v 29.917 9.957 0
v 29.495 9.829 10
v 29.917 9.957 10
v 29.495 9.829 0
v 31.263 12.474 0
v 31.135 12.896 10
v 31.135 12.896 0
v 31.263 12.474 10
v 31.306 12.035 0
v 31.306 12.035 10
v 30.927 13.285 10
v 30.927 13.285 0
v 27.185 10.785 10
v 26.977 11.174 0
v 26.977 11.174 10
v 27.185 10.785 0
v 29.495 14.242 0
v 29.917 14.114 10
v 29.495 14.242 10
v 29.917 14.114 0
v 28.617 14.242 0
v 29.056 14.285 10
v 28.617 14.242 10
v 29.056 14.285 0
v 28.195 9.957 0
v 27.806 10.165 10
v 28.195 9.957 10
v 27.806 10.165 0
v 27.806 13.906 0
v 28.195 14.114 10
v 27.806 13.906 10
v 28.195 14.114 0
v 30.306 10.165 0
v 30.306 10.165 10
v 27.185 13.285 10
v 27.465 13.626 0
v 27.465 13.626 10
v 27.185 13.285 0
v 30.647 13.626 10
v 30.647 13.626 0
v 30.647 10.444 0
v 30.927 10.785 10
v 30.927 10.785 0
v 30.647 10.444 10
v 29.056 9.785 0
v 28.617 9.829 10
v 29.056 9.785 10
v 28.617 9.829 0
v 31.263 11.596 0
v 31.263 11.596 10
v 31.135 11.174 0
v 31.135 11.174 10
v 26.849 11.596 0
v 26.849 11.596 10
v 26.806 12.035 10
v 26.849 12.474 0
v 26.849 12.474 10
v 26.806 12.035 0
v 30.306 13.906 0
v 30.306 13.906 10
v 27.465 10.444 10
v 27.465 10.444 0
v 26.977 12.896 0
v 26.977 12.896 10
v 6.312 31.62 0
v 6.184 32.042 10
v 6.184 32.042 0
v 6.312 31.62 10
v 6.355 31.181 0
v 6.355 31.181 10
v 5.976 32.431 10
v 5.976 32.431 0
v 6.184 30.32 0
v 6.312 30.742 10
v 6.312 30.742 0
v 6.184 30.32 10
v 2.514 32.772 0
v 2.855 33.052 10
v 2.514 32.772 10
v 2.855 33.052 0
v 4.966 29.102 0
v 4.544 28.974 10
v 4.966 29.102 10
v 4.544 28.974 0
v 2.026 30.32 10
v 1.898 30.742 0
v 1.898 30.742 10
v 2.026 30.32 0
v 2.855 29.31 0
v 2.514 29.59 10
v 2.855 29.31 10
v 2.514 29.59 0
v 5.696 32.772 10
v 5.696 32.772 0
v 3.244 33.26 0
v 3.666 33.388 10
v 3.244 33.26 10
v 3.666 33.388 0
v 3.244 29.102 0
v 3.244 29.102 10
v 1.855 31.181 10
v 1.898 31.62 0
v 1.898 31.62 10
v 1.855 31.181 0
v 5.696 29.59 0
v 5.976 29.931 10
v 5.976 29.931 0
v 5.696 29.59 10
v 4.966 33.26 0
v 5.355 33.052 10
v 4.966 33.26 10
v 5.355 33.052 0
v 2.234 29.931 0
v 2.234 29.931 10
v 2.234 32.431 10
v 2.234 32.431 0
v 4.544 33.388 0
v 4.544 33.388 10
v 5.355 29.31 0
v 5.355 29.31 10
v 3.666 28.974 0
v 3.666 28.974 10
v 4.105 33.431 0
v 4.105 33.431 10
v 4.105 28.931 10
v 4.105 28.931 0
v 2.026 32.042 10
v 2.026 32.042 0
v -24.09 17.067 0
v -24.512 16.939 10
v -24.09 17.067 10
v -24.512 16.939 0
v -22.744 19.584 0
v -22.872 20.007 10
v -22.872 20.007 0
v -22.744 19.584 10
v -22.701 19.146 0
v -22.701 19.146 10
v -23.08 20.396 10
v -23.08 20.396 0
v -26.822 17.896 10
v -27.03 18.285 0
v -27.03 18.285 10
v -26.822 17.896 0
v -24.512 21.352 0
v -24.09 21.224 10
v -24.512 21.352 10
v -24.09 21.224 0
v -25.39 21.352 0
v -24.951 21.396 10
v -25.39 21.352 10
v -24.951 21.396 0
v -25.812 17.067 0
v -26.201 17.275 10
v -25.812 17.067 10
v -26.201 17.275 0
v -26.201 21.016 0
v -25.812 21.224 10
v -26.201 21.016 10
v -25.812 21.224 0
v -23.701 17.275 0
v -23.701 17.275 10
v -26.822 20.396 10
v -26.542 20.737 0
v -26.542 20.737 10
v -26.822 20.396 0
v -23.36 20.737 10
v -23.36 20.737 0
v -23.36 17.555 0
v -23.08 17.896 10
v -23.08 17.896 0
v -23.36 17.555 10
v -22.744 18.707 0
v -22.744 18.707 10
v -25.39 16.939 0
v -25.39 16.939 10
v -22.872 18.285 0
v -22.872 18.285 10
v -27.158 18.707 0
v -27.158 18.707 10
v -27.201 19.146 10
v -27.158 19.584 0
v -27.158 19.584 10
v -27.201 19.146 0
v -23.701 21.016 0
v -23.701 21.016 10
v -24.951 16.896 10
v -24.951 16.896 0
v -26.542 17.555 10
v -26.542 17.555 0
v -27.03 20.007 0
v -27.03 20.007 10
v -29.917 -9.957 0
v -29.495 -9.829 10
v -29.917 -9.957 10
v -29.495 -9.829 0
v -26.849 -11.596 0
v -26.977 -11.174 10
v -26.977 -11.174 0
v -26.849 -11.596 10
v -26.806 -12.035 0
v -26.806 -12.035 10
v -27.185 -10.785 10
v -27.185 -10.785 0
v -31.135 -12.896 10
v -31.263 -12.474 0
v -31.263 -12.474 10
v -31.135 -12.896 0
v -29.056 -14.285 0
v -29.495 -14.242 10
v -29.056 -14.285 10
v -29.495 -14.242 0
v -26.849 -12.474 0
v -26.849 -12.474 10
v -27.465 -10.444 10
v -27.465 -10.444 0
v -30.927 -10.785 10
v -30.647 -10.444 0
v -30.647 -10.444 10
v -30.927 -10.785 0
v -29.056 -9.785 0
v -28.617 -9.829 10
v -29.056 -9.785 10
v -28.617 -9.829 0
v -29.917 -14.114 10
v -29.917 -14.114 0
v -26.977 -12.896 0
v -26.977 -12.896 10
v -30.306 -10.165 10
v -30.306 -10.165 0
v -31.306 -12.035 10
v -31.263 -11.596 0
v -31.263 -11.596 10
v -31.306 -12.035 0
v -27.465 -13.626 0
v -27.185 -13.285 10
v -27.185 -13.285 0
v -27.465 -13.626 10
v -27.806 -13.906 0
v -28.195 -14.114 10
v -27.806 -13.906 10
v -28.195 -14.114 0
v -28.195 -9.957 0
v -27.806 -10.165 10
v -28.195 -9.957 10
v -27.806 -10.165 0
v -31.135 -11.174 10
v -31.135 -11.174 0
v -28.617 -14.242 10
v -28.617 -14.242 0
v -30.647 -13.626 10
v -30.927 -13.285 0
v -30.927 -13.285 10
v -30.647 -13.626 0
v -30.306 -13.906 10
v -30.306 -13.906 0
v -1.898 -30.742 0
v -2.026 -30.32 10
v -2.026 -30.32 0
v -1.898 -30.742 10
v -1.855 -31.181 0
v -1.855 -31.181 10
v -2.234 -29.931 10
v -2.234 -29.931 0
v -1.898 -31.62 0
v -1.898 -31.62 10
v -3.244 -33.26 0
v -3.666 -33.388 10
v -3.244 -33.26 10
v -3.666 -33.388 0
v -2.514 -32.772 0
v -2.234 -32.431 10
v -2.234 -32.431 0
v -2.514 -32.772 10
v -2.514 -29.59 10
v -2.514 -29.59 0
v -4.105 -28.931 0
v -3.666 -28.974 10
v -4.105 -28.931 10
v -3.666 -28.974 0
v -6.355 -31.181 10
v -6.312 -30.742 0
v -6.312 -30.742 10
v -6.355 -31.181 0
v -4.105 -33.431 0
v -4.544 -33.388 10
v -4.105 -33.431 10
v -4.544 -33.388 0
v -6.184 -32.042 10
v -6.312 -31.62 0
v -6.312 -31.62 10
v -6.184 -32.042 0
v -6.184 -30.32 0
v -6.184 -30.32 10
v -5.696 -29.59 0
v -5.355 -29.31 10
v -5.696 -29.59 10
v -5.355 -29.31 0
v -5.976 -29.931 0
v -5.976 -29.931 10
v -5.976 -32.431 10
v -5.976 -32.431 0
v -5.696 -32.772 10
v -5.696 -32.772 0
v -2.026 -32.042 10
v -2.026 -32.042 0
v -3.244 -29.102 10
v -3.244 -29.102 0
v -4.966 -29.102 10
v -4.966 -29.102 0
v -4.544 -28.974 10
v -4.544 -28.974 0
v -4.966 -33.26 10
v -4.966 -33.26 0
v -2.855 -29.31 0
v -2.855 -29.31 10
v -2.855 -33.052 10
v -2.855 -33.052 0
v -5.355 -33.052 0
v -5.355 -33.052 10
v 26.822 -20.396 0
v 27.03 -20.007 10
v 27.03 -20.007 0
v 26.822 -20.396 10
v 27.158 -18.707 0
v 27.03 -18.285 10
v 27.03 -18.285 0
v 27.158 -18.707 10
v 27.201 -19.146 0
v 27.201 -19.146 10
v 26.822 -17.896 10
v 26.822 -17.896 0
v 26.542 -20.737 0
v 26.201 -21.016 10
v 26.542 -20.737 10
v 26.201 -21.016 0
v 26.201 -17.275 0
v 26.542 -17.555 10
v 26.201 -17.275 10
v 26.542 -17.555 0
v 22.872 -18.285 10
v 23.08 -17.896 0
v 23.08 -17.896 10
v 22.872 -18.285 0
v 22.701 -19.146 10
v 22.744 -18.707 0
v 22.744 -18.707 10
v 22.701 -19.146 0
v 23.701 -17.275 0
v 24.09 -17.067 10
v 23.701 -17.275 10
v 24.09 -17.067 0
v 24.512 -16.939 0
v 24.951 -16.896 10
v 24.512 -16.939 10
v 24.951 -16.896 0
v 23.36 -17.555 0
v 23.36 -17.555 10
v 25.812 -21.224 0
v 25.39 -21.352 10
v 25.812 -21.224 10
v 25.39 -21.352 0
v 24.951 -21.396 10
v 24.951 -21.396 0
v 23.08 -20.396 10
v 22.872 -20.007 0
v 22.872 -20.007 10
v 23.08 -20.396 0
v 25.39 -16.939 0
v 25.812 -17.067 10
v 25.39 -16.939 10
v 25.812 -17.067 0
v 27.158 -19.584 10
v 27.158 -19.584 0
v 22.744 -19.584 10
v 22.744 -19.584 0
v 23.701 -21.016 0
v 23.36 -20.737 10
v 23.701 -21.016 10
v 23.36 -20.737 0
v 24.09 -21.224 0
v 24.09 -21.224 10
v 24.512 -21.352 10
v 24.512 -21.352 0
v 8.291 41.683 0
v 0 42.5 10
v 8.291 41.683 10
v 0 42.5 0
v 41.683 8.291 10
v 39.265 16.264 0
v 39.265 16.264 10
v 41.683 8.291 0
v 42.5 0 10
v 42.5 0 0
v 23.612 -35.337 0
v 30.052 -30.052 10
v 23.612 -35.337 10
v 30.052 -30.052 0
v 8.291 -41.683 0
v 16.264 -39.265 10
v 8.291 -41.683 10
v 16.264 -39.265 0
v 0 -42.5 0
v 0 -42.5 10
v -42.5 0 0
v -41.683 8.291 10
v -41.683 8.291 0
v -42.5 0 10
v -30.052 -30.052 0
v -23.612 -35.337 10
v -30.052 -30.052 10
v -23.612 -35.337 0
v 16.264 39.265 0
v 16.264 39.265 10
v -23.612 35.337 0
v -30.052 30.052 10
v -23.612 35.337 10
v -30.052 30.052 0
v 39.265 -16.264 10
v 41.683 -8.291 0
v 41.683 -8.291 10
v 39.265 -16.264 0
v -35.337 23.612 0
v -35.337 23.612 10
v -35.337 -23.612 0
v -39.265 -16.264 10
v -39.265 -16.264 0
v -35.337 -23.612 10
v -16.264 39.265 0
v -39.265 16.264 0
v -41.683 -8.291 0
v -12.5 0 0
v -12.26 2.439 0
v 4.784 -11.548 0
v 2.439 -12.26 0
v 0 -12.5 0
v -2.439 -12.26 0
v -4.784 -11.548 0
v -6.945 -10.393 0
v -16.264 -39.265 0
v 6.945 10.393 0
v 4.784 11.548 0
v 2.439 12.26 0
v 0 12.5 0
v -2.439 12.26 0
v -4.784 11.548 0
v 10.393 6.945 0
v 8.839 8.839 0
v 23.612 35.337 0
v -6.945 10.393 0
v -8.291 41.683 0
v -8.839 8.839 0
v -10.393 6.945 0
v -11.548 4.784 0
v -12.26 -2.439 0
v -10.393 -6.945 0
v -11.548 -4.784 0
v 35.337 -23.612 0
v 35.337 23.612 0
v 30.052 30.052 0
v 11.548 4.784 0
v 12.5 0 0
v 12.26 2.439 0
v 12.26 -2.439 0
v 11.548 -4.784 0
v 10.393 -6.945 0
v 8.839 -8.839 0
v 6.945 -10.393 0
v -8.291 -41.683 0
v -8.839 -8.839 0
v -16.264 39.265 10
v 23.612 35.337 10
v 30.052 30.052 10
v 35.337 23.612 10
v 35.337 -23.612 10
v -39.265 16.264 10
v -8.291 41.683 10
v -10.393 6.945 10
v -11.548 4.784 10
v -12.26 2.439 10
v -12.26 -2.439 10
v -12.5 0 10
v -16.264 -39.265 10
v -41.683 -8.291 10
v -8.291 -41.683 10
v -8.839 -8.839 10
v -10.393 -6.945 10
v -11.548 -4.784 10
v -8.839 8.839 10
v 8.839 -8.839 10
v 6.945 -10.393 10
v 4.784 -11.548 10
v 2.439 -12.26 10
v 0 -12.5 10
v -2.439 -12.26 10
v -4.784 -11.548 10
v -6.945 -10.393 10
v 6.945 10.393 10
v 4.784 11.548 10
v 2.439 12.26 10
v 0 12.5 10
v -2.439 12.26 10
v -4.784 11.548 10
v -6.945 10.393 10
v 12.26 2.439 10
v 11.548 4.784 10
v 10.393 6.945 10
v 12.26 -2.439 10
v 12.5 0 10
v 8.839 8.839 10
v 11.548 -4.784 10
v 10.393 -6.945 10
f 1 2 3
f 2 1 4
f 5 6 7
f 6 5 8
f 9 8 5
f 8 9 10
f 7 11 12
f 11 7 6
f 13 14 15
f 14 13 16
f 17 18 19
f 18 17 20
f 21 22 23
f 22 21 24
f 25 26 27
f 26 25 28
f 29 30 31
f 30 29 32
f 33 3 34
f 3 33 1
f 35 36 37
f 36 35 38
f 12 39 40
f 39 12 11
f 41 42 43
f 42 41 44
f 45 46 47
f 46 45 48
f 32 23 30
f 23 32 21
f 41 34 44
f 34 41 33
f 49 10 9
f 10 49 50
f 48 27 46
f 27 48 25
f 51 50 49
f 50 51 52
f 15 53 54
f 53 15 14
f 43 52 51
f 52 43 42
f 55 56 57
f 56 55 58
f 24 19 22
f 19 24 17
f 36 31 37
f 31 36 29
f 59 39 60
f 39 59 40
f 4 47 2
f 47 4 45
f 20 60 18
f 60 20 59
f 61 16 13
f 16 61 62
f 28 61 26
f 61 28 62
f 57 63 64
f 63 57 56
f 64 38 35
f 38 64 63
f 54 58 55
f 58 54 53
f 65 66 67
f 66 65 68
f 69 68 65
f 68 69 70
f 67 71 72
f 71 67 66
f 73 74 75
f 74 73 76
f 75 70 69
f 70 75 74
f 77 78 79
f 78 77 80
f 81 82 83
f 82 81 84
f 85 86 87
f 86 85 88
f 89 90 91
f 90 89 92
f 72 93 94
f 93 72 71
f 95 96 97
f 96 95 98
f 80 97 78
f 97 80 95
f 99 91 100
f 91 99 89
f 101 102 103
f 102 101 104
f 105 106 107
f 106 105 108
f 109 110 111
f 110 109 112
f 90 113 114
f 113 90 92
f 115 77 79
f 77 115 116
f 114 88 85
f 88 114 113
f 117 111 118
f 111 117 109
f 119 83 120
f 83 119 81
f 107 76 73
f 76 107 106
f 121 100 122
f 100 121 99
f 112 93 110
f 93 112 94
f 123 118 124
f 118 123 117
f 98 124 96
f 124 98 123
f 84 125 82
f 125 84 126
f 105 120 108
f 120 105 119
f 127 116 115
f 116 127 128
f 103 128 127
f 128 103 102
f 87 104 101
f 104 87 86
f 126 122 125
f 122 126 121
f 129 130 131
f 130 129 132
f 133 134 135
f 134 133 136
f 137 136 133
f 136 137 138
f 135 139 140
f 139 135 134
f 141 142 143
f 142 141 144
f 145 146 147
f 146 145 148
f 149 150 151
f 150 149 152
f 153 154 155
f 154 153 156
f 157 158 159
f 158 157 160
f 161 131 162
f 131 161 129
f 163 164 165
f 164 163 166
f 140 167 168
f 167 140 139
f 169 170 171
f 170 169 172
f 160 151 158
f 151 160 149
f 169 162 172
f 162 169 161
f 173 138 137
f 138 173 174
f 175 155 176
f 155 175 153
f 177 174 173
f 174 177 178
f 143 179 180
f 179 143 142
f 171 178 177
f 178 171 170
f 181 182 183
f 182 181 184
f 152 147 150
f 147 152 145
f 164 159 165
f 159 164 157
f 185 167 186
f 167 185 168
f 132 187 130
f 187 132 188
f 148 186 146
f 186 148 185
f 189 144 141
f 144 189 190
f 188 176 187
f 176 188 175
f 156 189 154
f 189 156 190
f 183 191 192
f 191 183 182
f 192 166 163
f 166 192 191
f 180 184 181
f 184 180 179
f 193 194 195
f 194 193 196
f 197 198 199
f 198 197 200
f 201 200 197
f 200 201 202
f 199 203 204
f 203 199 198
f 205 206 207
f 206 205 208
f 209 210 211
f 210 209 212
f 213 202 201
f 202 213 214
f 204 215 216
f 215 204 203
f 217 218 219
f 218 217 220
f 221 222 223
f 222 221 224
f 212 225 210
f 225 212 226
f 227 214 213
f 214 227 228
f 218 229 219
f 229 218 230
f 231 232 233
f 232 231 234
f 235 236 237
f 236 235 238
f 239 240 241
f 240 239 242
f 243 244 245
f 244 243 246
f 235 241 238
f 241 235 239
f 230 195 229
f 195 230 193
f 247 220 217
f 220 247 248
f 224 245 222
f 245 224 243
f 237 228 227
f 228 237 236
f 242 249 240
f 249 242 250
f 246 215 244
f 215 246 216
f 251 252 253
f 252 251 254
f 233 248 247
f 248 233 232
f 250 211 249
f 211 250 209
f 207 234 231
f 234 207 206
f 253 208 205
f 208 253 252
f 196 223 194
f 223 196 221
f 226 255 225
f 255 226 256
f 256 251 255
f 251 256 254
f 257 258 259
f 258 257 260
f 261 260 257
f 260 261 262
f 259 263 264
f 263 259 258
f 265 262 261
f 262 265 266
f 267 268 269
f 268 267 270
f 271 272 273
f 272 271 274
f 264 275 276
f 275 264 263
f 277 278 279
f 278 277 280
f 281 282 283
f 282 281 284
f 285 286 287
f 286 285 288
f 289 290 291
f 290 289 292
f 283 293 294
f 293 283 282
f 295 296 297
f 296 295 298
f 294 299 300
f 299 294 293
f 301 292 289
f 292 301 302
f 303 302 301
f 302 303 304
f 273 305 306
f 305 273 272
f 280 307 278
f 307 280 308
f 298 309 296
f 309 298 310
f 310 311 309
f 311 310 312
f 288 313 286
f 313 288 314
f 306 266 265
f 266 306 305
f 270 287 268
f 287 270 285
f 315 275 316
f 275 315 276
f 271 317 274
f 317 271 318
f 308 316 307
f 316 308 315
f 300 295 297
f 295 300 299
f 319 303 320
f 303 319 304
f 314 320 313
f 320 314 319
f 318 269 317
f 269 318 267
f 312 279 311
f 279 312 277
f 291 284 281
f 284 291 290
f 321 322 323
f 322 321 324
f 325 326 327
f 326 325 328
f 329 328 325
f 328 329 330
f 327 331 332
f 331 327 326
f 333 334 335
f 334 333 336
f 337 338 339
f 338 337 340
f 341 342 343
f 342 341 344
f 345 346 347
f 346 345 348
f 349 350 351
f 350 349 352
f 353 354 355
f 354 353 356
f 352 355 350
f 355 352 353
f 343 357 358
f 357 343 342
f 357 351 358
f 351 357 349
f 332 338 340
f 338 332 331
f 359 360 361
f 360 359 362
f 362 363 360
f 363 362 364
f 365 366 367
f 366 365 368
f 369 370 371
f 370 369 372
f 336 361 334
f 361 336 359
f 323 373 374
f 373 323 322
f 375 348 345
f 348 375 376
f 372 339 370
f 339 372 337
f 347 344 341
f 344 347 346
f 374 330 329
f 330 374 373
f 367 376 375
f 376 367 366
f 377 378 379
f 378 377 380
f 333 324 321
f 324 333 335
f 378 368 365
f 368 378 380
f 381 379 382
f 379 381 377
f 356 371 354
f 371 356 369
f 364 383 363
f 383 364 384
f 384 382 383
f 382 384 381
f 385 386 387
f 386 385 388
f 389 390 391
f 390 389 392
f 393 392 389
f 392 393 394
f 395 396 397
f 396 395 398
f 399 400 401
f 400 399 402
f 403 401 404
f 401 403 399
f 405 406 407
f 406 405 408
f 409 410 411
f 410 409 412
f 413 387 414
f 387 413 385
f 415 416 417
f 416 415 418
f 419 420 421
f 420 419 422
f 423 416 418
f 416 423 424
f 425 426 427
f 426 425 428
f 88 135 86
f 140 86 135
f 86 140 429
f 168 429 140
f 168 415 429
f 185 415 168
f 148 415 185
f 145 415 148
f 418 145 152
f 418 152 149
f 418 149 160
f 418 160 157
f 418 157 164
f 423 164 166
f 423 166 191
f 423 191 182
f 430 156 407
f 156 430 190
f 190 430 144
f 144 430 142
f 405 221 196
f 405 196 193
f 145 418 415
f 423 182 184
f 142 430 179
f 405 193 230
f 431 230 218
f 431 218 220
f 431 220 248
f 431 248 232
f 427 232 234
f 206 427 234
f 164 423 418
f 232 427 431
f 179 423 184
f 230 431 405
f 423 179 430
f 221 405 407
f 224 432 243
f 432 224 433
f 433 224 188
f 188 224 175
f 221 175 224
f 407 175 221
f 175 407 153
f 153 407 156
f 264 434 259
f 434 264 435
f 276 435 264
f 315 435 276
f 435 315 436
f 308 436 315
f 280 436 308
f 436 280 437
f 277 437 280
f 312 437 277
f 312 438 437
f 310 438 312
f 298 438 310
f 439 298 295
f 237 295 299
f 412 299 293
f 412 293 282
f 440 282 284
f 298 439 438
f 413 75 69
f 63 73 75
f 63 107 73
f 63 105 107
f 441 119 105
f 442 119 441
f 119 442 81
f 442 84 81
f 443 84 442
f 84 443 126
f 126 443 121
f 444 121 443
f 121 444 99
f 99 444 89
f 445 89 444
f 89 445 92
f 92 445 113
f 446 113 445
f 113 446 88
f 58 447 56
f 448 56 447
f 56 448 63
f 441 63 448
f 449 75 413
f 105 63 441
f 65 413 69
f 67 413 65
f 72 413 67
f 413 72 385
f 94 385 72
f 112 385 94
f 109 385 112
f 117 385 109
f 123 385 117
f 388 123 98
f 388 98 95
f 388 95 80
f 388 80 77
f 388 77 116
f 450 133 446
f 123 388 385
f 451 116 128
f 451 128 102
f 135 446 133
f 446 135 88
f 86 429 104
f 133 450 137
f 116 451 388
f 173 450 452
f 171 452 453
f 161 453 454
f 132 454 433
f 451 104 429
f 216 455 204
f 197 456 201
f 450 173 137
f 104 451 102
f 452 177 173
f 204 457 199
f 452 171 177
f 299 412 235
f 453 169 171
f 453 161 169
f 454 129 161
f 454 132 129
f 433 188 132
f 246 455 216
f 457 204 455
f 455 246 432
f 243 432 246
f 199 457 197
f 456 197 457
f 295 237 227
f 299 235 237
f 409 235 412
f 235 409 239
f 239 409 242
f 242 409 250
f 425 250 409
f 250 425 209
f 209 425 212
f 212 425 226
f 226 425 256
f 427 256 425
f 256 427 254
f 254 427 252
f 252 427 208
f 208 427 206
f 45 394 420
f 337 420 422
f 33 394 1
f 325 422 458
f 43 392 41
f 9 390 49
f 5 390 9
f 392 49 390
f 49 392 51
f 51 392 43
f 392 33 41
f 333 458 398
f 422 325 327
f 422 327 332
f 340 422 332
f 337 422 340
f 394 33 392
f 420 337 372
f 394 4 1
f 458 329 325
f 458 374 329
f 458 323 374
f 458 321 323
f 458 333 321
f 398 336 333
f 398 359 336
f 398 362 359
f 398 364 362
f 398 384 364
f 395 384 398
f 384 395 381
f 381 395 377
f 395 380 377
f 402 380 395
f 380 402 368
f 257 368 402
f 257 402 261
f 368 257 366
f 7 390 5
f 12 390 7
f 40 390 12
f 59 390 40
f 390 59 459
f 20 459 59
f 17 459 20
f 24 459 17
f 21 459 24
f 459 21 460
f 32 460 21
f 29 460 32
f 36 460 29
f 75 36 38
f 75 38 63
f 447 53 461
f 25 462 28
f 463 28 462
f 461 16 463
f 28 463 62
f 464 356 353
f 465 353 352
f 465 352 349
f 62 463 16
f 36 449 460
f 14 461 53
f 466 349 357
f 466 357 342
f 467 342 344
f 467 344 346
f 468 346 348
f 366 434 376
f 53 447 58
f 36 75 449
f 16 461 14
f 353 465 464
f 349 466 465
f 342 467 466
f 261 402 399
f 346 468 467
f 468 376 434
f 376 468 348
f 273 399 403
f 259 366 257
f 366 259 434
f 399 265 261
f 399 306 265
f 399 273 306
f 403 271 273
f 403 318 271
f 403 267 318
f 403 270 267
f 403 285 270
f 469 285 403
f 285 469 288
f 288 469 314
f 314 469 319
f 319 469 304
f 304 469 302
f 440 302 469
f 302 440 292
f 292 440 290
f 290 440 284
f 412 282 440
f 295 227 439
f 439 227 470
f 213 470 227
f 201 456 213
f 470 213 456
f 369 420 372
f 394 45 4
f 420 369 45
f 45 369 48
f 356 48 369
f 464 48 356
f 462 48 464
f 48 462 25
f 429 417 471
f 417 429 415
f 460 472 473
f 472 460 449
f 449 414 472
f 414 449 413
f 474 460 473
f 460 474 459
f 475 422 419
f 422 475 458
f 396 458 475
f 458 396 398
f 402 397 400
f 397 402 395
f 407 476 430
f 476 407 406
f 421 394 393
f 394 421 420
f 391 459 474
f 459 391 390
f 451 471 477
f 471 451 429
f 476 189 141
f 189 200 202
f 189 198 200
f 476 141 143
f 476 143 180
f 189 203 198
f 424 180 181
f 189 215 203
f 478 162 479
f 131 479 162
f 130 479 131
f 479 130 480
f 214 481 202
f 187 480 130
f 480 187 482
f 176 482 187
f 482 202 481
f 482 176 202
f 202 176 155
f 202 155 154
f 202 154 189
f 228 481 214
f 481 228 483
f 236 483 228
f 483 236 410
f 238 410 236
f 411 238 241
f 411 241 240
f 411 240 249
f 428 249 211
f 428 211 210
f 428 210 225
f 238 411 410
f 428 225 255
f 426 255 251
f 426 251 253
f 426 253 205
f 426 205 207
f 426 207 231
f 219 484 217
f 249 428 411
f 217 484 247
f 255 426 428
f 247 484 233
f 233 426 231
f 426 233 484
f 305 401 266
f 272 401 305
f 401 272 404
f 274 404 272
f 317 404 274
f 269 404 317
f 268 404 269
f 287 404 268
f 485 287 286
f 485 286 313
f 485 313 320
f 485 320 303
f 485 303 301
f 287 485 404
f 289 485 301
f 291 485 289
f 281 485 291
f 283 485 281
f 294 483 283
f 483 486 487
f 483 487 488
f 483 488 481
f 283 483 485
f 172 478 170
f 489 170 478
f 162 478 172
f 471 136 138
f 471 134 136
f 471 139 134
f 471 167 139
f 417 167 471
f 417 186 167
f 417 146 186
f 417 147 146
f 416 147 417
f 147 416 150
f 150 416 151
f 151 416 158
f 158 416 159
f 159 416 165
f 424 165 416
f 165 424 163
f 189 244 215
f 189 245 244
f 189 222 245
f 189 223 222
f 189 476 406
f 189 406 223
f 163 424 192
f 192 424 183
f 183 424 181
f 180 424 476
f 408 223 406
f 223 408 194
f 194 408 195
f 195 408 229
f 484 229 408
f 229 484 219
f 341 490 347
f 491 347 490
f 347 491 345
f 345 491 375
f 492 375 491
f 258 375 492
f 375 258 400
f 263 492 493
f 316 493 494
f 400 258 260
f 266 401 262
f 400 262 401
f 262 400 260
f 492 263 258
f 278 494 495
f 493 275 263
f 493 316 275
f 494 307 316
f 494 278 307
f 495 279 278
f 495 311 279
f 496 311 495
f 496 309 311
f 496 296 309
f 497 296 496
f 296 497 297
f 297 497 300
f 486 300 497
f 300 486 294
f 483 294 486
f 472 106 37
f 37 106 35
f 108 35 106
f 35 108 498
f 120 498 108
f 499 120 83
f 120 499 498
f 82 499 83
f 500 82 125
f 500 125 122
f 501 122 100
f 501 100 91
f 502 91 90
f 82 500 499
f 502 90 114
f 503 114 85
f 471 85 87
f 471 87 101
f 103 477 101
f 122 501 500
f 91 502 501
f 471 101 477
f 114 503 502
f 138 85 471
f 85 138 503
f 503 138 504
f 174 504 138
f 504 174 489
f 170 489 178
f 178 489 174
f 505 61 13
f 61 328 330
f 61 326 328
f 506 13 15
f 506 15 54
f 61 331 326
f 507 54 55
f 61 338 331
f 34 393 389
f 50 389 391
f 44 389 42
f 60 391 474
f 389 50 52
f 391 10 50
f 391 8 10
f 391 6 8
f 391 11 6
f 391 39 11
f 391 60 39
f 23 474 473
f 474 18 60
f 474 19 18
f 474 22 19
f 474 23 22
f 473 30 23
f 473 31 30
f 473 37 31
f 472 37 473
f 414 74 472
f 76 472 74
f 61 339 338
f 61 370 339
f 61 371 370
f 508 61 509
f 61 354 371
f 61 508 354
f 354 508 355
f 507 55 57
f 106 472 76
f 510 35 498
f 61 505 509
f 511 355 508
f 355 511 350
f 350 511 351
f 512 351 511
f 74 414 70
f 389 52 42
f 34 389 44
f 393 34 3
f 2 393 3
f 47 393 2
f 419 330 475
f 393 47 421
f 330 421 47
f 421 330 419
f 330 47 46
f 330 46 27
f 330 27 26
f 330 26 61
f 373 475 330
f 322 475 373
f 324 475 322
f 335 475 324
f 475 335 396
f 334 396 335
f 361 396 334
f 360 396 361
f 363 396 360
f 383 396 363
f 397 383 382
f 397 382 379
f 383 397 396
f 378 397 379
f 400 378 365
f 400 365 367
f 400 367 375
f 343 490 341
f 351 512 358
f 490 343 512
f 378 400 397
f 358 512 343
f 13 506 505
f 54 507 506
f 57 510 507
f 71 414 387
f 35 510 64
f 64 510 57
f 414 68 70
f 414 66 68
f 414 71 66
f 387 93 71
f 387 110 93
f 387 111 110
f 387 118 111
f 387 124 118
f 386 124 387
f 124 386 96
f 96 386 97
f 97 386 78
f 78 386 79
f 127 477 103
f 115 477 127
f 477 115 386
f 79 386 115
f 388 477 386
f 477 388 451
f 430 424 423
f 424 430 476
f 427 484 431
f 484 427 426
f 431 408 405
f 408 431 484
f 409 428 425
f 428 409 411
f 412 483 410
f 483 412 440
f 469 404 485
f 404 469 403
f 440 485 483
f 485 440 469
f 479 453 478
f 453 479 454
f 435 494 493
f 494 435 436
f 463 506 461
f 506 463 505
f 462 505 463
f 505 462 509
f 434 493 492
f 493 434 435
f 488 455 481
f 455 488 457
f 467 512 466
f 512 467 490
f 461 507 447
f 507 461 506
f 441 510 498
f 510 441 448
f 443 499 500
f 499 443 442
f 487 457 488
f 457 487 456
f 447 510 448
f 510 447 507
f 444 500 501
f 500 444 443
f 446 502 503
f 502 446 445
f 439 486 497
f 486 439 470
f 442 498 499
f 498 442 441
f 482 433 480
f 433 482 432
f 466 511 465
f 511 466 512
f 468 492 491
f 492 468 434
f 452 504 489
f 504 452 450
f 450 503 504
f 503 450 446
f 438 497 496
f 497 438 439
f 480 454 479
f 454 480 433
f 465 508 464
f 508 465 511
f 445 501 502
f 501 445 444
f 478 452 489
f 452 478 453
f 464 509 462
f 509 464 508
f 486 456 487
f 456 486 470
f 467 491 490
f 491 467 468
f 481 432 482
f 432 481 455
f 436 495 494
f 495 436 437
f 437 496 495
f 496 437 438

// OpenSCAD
$fn = 32;

// ----------------------------------------------------------------------
// Flange Ø85 x 10
// 6 holes on a Ø62.9 bolt circle, bolted joints
// ----------------------------------------------------------------------

// --- parameters (mm) ---
flange_d = 85;     // outside diameter of the flange
thickness = 10;    // flange thickness
holes = 6;         // number of bolt holes
pcd = 62.9;        // bolt circle diameter
start_deg = 22.5;  // angle of the first hole, from +X
hole_d = 4.5;      // bolt hole diameter
bore_d = 25;       // central through bore
hub_d = 35;        // hub outside diameter
hub_h = 0;         // hub height above the flange face (0 = no hub)

// --- derived feature positions (mm) ---
height = thickness + hub_h;  // = 10   overall height of the part
pcd_r = pcd / 2;             // = 31.45   bolt circle radius
hole_step = 360 / holes;     // = 60   angular pitch
feature_centers = [
  [pcd_r * cos(start_deg + 0 * hole_step), pcd_r * sin(start_deg + 0 * hole_step)],
  [pcd_r * cos(start_deg + 1 * hole_step), pcd_r * sin(start_deg + 1 * hole_step)],
  [pcd_r * cos(start_deg + 2 * hole_step), pcd_r * sin(start_deg + 2 * hole_step)],
  [pcd_r * cos(start_deg + 3 * hole_step), pcd_r * sin(start_deg + 3 * hole_step)],
  [pcd_r * cos(start_deg + 4 * hole_step), pcd_r * sin(start_deg + 4 * hole_step)],
  [pcd_r * cos(start_deg + 5 * hole_step), pcd_r * sin(start_deg + 5 * hole_step)]
];   // bolt hole centres on the pitch circle

// flange disc, every hole and the bore cut straight through
difference() {
  union() {
    cylinder(d = flange_d, h = thickness);
  }
  translate([0, 0, -1]) cylinder(d = bore_d, h = height + 2);  // bore, through
  for (centre = feature_centers)
    translate([centre[0], centre[1], -1]) cylinder(d = hole_d, h = thickness + 2);
}
